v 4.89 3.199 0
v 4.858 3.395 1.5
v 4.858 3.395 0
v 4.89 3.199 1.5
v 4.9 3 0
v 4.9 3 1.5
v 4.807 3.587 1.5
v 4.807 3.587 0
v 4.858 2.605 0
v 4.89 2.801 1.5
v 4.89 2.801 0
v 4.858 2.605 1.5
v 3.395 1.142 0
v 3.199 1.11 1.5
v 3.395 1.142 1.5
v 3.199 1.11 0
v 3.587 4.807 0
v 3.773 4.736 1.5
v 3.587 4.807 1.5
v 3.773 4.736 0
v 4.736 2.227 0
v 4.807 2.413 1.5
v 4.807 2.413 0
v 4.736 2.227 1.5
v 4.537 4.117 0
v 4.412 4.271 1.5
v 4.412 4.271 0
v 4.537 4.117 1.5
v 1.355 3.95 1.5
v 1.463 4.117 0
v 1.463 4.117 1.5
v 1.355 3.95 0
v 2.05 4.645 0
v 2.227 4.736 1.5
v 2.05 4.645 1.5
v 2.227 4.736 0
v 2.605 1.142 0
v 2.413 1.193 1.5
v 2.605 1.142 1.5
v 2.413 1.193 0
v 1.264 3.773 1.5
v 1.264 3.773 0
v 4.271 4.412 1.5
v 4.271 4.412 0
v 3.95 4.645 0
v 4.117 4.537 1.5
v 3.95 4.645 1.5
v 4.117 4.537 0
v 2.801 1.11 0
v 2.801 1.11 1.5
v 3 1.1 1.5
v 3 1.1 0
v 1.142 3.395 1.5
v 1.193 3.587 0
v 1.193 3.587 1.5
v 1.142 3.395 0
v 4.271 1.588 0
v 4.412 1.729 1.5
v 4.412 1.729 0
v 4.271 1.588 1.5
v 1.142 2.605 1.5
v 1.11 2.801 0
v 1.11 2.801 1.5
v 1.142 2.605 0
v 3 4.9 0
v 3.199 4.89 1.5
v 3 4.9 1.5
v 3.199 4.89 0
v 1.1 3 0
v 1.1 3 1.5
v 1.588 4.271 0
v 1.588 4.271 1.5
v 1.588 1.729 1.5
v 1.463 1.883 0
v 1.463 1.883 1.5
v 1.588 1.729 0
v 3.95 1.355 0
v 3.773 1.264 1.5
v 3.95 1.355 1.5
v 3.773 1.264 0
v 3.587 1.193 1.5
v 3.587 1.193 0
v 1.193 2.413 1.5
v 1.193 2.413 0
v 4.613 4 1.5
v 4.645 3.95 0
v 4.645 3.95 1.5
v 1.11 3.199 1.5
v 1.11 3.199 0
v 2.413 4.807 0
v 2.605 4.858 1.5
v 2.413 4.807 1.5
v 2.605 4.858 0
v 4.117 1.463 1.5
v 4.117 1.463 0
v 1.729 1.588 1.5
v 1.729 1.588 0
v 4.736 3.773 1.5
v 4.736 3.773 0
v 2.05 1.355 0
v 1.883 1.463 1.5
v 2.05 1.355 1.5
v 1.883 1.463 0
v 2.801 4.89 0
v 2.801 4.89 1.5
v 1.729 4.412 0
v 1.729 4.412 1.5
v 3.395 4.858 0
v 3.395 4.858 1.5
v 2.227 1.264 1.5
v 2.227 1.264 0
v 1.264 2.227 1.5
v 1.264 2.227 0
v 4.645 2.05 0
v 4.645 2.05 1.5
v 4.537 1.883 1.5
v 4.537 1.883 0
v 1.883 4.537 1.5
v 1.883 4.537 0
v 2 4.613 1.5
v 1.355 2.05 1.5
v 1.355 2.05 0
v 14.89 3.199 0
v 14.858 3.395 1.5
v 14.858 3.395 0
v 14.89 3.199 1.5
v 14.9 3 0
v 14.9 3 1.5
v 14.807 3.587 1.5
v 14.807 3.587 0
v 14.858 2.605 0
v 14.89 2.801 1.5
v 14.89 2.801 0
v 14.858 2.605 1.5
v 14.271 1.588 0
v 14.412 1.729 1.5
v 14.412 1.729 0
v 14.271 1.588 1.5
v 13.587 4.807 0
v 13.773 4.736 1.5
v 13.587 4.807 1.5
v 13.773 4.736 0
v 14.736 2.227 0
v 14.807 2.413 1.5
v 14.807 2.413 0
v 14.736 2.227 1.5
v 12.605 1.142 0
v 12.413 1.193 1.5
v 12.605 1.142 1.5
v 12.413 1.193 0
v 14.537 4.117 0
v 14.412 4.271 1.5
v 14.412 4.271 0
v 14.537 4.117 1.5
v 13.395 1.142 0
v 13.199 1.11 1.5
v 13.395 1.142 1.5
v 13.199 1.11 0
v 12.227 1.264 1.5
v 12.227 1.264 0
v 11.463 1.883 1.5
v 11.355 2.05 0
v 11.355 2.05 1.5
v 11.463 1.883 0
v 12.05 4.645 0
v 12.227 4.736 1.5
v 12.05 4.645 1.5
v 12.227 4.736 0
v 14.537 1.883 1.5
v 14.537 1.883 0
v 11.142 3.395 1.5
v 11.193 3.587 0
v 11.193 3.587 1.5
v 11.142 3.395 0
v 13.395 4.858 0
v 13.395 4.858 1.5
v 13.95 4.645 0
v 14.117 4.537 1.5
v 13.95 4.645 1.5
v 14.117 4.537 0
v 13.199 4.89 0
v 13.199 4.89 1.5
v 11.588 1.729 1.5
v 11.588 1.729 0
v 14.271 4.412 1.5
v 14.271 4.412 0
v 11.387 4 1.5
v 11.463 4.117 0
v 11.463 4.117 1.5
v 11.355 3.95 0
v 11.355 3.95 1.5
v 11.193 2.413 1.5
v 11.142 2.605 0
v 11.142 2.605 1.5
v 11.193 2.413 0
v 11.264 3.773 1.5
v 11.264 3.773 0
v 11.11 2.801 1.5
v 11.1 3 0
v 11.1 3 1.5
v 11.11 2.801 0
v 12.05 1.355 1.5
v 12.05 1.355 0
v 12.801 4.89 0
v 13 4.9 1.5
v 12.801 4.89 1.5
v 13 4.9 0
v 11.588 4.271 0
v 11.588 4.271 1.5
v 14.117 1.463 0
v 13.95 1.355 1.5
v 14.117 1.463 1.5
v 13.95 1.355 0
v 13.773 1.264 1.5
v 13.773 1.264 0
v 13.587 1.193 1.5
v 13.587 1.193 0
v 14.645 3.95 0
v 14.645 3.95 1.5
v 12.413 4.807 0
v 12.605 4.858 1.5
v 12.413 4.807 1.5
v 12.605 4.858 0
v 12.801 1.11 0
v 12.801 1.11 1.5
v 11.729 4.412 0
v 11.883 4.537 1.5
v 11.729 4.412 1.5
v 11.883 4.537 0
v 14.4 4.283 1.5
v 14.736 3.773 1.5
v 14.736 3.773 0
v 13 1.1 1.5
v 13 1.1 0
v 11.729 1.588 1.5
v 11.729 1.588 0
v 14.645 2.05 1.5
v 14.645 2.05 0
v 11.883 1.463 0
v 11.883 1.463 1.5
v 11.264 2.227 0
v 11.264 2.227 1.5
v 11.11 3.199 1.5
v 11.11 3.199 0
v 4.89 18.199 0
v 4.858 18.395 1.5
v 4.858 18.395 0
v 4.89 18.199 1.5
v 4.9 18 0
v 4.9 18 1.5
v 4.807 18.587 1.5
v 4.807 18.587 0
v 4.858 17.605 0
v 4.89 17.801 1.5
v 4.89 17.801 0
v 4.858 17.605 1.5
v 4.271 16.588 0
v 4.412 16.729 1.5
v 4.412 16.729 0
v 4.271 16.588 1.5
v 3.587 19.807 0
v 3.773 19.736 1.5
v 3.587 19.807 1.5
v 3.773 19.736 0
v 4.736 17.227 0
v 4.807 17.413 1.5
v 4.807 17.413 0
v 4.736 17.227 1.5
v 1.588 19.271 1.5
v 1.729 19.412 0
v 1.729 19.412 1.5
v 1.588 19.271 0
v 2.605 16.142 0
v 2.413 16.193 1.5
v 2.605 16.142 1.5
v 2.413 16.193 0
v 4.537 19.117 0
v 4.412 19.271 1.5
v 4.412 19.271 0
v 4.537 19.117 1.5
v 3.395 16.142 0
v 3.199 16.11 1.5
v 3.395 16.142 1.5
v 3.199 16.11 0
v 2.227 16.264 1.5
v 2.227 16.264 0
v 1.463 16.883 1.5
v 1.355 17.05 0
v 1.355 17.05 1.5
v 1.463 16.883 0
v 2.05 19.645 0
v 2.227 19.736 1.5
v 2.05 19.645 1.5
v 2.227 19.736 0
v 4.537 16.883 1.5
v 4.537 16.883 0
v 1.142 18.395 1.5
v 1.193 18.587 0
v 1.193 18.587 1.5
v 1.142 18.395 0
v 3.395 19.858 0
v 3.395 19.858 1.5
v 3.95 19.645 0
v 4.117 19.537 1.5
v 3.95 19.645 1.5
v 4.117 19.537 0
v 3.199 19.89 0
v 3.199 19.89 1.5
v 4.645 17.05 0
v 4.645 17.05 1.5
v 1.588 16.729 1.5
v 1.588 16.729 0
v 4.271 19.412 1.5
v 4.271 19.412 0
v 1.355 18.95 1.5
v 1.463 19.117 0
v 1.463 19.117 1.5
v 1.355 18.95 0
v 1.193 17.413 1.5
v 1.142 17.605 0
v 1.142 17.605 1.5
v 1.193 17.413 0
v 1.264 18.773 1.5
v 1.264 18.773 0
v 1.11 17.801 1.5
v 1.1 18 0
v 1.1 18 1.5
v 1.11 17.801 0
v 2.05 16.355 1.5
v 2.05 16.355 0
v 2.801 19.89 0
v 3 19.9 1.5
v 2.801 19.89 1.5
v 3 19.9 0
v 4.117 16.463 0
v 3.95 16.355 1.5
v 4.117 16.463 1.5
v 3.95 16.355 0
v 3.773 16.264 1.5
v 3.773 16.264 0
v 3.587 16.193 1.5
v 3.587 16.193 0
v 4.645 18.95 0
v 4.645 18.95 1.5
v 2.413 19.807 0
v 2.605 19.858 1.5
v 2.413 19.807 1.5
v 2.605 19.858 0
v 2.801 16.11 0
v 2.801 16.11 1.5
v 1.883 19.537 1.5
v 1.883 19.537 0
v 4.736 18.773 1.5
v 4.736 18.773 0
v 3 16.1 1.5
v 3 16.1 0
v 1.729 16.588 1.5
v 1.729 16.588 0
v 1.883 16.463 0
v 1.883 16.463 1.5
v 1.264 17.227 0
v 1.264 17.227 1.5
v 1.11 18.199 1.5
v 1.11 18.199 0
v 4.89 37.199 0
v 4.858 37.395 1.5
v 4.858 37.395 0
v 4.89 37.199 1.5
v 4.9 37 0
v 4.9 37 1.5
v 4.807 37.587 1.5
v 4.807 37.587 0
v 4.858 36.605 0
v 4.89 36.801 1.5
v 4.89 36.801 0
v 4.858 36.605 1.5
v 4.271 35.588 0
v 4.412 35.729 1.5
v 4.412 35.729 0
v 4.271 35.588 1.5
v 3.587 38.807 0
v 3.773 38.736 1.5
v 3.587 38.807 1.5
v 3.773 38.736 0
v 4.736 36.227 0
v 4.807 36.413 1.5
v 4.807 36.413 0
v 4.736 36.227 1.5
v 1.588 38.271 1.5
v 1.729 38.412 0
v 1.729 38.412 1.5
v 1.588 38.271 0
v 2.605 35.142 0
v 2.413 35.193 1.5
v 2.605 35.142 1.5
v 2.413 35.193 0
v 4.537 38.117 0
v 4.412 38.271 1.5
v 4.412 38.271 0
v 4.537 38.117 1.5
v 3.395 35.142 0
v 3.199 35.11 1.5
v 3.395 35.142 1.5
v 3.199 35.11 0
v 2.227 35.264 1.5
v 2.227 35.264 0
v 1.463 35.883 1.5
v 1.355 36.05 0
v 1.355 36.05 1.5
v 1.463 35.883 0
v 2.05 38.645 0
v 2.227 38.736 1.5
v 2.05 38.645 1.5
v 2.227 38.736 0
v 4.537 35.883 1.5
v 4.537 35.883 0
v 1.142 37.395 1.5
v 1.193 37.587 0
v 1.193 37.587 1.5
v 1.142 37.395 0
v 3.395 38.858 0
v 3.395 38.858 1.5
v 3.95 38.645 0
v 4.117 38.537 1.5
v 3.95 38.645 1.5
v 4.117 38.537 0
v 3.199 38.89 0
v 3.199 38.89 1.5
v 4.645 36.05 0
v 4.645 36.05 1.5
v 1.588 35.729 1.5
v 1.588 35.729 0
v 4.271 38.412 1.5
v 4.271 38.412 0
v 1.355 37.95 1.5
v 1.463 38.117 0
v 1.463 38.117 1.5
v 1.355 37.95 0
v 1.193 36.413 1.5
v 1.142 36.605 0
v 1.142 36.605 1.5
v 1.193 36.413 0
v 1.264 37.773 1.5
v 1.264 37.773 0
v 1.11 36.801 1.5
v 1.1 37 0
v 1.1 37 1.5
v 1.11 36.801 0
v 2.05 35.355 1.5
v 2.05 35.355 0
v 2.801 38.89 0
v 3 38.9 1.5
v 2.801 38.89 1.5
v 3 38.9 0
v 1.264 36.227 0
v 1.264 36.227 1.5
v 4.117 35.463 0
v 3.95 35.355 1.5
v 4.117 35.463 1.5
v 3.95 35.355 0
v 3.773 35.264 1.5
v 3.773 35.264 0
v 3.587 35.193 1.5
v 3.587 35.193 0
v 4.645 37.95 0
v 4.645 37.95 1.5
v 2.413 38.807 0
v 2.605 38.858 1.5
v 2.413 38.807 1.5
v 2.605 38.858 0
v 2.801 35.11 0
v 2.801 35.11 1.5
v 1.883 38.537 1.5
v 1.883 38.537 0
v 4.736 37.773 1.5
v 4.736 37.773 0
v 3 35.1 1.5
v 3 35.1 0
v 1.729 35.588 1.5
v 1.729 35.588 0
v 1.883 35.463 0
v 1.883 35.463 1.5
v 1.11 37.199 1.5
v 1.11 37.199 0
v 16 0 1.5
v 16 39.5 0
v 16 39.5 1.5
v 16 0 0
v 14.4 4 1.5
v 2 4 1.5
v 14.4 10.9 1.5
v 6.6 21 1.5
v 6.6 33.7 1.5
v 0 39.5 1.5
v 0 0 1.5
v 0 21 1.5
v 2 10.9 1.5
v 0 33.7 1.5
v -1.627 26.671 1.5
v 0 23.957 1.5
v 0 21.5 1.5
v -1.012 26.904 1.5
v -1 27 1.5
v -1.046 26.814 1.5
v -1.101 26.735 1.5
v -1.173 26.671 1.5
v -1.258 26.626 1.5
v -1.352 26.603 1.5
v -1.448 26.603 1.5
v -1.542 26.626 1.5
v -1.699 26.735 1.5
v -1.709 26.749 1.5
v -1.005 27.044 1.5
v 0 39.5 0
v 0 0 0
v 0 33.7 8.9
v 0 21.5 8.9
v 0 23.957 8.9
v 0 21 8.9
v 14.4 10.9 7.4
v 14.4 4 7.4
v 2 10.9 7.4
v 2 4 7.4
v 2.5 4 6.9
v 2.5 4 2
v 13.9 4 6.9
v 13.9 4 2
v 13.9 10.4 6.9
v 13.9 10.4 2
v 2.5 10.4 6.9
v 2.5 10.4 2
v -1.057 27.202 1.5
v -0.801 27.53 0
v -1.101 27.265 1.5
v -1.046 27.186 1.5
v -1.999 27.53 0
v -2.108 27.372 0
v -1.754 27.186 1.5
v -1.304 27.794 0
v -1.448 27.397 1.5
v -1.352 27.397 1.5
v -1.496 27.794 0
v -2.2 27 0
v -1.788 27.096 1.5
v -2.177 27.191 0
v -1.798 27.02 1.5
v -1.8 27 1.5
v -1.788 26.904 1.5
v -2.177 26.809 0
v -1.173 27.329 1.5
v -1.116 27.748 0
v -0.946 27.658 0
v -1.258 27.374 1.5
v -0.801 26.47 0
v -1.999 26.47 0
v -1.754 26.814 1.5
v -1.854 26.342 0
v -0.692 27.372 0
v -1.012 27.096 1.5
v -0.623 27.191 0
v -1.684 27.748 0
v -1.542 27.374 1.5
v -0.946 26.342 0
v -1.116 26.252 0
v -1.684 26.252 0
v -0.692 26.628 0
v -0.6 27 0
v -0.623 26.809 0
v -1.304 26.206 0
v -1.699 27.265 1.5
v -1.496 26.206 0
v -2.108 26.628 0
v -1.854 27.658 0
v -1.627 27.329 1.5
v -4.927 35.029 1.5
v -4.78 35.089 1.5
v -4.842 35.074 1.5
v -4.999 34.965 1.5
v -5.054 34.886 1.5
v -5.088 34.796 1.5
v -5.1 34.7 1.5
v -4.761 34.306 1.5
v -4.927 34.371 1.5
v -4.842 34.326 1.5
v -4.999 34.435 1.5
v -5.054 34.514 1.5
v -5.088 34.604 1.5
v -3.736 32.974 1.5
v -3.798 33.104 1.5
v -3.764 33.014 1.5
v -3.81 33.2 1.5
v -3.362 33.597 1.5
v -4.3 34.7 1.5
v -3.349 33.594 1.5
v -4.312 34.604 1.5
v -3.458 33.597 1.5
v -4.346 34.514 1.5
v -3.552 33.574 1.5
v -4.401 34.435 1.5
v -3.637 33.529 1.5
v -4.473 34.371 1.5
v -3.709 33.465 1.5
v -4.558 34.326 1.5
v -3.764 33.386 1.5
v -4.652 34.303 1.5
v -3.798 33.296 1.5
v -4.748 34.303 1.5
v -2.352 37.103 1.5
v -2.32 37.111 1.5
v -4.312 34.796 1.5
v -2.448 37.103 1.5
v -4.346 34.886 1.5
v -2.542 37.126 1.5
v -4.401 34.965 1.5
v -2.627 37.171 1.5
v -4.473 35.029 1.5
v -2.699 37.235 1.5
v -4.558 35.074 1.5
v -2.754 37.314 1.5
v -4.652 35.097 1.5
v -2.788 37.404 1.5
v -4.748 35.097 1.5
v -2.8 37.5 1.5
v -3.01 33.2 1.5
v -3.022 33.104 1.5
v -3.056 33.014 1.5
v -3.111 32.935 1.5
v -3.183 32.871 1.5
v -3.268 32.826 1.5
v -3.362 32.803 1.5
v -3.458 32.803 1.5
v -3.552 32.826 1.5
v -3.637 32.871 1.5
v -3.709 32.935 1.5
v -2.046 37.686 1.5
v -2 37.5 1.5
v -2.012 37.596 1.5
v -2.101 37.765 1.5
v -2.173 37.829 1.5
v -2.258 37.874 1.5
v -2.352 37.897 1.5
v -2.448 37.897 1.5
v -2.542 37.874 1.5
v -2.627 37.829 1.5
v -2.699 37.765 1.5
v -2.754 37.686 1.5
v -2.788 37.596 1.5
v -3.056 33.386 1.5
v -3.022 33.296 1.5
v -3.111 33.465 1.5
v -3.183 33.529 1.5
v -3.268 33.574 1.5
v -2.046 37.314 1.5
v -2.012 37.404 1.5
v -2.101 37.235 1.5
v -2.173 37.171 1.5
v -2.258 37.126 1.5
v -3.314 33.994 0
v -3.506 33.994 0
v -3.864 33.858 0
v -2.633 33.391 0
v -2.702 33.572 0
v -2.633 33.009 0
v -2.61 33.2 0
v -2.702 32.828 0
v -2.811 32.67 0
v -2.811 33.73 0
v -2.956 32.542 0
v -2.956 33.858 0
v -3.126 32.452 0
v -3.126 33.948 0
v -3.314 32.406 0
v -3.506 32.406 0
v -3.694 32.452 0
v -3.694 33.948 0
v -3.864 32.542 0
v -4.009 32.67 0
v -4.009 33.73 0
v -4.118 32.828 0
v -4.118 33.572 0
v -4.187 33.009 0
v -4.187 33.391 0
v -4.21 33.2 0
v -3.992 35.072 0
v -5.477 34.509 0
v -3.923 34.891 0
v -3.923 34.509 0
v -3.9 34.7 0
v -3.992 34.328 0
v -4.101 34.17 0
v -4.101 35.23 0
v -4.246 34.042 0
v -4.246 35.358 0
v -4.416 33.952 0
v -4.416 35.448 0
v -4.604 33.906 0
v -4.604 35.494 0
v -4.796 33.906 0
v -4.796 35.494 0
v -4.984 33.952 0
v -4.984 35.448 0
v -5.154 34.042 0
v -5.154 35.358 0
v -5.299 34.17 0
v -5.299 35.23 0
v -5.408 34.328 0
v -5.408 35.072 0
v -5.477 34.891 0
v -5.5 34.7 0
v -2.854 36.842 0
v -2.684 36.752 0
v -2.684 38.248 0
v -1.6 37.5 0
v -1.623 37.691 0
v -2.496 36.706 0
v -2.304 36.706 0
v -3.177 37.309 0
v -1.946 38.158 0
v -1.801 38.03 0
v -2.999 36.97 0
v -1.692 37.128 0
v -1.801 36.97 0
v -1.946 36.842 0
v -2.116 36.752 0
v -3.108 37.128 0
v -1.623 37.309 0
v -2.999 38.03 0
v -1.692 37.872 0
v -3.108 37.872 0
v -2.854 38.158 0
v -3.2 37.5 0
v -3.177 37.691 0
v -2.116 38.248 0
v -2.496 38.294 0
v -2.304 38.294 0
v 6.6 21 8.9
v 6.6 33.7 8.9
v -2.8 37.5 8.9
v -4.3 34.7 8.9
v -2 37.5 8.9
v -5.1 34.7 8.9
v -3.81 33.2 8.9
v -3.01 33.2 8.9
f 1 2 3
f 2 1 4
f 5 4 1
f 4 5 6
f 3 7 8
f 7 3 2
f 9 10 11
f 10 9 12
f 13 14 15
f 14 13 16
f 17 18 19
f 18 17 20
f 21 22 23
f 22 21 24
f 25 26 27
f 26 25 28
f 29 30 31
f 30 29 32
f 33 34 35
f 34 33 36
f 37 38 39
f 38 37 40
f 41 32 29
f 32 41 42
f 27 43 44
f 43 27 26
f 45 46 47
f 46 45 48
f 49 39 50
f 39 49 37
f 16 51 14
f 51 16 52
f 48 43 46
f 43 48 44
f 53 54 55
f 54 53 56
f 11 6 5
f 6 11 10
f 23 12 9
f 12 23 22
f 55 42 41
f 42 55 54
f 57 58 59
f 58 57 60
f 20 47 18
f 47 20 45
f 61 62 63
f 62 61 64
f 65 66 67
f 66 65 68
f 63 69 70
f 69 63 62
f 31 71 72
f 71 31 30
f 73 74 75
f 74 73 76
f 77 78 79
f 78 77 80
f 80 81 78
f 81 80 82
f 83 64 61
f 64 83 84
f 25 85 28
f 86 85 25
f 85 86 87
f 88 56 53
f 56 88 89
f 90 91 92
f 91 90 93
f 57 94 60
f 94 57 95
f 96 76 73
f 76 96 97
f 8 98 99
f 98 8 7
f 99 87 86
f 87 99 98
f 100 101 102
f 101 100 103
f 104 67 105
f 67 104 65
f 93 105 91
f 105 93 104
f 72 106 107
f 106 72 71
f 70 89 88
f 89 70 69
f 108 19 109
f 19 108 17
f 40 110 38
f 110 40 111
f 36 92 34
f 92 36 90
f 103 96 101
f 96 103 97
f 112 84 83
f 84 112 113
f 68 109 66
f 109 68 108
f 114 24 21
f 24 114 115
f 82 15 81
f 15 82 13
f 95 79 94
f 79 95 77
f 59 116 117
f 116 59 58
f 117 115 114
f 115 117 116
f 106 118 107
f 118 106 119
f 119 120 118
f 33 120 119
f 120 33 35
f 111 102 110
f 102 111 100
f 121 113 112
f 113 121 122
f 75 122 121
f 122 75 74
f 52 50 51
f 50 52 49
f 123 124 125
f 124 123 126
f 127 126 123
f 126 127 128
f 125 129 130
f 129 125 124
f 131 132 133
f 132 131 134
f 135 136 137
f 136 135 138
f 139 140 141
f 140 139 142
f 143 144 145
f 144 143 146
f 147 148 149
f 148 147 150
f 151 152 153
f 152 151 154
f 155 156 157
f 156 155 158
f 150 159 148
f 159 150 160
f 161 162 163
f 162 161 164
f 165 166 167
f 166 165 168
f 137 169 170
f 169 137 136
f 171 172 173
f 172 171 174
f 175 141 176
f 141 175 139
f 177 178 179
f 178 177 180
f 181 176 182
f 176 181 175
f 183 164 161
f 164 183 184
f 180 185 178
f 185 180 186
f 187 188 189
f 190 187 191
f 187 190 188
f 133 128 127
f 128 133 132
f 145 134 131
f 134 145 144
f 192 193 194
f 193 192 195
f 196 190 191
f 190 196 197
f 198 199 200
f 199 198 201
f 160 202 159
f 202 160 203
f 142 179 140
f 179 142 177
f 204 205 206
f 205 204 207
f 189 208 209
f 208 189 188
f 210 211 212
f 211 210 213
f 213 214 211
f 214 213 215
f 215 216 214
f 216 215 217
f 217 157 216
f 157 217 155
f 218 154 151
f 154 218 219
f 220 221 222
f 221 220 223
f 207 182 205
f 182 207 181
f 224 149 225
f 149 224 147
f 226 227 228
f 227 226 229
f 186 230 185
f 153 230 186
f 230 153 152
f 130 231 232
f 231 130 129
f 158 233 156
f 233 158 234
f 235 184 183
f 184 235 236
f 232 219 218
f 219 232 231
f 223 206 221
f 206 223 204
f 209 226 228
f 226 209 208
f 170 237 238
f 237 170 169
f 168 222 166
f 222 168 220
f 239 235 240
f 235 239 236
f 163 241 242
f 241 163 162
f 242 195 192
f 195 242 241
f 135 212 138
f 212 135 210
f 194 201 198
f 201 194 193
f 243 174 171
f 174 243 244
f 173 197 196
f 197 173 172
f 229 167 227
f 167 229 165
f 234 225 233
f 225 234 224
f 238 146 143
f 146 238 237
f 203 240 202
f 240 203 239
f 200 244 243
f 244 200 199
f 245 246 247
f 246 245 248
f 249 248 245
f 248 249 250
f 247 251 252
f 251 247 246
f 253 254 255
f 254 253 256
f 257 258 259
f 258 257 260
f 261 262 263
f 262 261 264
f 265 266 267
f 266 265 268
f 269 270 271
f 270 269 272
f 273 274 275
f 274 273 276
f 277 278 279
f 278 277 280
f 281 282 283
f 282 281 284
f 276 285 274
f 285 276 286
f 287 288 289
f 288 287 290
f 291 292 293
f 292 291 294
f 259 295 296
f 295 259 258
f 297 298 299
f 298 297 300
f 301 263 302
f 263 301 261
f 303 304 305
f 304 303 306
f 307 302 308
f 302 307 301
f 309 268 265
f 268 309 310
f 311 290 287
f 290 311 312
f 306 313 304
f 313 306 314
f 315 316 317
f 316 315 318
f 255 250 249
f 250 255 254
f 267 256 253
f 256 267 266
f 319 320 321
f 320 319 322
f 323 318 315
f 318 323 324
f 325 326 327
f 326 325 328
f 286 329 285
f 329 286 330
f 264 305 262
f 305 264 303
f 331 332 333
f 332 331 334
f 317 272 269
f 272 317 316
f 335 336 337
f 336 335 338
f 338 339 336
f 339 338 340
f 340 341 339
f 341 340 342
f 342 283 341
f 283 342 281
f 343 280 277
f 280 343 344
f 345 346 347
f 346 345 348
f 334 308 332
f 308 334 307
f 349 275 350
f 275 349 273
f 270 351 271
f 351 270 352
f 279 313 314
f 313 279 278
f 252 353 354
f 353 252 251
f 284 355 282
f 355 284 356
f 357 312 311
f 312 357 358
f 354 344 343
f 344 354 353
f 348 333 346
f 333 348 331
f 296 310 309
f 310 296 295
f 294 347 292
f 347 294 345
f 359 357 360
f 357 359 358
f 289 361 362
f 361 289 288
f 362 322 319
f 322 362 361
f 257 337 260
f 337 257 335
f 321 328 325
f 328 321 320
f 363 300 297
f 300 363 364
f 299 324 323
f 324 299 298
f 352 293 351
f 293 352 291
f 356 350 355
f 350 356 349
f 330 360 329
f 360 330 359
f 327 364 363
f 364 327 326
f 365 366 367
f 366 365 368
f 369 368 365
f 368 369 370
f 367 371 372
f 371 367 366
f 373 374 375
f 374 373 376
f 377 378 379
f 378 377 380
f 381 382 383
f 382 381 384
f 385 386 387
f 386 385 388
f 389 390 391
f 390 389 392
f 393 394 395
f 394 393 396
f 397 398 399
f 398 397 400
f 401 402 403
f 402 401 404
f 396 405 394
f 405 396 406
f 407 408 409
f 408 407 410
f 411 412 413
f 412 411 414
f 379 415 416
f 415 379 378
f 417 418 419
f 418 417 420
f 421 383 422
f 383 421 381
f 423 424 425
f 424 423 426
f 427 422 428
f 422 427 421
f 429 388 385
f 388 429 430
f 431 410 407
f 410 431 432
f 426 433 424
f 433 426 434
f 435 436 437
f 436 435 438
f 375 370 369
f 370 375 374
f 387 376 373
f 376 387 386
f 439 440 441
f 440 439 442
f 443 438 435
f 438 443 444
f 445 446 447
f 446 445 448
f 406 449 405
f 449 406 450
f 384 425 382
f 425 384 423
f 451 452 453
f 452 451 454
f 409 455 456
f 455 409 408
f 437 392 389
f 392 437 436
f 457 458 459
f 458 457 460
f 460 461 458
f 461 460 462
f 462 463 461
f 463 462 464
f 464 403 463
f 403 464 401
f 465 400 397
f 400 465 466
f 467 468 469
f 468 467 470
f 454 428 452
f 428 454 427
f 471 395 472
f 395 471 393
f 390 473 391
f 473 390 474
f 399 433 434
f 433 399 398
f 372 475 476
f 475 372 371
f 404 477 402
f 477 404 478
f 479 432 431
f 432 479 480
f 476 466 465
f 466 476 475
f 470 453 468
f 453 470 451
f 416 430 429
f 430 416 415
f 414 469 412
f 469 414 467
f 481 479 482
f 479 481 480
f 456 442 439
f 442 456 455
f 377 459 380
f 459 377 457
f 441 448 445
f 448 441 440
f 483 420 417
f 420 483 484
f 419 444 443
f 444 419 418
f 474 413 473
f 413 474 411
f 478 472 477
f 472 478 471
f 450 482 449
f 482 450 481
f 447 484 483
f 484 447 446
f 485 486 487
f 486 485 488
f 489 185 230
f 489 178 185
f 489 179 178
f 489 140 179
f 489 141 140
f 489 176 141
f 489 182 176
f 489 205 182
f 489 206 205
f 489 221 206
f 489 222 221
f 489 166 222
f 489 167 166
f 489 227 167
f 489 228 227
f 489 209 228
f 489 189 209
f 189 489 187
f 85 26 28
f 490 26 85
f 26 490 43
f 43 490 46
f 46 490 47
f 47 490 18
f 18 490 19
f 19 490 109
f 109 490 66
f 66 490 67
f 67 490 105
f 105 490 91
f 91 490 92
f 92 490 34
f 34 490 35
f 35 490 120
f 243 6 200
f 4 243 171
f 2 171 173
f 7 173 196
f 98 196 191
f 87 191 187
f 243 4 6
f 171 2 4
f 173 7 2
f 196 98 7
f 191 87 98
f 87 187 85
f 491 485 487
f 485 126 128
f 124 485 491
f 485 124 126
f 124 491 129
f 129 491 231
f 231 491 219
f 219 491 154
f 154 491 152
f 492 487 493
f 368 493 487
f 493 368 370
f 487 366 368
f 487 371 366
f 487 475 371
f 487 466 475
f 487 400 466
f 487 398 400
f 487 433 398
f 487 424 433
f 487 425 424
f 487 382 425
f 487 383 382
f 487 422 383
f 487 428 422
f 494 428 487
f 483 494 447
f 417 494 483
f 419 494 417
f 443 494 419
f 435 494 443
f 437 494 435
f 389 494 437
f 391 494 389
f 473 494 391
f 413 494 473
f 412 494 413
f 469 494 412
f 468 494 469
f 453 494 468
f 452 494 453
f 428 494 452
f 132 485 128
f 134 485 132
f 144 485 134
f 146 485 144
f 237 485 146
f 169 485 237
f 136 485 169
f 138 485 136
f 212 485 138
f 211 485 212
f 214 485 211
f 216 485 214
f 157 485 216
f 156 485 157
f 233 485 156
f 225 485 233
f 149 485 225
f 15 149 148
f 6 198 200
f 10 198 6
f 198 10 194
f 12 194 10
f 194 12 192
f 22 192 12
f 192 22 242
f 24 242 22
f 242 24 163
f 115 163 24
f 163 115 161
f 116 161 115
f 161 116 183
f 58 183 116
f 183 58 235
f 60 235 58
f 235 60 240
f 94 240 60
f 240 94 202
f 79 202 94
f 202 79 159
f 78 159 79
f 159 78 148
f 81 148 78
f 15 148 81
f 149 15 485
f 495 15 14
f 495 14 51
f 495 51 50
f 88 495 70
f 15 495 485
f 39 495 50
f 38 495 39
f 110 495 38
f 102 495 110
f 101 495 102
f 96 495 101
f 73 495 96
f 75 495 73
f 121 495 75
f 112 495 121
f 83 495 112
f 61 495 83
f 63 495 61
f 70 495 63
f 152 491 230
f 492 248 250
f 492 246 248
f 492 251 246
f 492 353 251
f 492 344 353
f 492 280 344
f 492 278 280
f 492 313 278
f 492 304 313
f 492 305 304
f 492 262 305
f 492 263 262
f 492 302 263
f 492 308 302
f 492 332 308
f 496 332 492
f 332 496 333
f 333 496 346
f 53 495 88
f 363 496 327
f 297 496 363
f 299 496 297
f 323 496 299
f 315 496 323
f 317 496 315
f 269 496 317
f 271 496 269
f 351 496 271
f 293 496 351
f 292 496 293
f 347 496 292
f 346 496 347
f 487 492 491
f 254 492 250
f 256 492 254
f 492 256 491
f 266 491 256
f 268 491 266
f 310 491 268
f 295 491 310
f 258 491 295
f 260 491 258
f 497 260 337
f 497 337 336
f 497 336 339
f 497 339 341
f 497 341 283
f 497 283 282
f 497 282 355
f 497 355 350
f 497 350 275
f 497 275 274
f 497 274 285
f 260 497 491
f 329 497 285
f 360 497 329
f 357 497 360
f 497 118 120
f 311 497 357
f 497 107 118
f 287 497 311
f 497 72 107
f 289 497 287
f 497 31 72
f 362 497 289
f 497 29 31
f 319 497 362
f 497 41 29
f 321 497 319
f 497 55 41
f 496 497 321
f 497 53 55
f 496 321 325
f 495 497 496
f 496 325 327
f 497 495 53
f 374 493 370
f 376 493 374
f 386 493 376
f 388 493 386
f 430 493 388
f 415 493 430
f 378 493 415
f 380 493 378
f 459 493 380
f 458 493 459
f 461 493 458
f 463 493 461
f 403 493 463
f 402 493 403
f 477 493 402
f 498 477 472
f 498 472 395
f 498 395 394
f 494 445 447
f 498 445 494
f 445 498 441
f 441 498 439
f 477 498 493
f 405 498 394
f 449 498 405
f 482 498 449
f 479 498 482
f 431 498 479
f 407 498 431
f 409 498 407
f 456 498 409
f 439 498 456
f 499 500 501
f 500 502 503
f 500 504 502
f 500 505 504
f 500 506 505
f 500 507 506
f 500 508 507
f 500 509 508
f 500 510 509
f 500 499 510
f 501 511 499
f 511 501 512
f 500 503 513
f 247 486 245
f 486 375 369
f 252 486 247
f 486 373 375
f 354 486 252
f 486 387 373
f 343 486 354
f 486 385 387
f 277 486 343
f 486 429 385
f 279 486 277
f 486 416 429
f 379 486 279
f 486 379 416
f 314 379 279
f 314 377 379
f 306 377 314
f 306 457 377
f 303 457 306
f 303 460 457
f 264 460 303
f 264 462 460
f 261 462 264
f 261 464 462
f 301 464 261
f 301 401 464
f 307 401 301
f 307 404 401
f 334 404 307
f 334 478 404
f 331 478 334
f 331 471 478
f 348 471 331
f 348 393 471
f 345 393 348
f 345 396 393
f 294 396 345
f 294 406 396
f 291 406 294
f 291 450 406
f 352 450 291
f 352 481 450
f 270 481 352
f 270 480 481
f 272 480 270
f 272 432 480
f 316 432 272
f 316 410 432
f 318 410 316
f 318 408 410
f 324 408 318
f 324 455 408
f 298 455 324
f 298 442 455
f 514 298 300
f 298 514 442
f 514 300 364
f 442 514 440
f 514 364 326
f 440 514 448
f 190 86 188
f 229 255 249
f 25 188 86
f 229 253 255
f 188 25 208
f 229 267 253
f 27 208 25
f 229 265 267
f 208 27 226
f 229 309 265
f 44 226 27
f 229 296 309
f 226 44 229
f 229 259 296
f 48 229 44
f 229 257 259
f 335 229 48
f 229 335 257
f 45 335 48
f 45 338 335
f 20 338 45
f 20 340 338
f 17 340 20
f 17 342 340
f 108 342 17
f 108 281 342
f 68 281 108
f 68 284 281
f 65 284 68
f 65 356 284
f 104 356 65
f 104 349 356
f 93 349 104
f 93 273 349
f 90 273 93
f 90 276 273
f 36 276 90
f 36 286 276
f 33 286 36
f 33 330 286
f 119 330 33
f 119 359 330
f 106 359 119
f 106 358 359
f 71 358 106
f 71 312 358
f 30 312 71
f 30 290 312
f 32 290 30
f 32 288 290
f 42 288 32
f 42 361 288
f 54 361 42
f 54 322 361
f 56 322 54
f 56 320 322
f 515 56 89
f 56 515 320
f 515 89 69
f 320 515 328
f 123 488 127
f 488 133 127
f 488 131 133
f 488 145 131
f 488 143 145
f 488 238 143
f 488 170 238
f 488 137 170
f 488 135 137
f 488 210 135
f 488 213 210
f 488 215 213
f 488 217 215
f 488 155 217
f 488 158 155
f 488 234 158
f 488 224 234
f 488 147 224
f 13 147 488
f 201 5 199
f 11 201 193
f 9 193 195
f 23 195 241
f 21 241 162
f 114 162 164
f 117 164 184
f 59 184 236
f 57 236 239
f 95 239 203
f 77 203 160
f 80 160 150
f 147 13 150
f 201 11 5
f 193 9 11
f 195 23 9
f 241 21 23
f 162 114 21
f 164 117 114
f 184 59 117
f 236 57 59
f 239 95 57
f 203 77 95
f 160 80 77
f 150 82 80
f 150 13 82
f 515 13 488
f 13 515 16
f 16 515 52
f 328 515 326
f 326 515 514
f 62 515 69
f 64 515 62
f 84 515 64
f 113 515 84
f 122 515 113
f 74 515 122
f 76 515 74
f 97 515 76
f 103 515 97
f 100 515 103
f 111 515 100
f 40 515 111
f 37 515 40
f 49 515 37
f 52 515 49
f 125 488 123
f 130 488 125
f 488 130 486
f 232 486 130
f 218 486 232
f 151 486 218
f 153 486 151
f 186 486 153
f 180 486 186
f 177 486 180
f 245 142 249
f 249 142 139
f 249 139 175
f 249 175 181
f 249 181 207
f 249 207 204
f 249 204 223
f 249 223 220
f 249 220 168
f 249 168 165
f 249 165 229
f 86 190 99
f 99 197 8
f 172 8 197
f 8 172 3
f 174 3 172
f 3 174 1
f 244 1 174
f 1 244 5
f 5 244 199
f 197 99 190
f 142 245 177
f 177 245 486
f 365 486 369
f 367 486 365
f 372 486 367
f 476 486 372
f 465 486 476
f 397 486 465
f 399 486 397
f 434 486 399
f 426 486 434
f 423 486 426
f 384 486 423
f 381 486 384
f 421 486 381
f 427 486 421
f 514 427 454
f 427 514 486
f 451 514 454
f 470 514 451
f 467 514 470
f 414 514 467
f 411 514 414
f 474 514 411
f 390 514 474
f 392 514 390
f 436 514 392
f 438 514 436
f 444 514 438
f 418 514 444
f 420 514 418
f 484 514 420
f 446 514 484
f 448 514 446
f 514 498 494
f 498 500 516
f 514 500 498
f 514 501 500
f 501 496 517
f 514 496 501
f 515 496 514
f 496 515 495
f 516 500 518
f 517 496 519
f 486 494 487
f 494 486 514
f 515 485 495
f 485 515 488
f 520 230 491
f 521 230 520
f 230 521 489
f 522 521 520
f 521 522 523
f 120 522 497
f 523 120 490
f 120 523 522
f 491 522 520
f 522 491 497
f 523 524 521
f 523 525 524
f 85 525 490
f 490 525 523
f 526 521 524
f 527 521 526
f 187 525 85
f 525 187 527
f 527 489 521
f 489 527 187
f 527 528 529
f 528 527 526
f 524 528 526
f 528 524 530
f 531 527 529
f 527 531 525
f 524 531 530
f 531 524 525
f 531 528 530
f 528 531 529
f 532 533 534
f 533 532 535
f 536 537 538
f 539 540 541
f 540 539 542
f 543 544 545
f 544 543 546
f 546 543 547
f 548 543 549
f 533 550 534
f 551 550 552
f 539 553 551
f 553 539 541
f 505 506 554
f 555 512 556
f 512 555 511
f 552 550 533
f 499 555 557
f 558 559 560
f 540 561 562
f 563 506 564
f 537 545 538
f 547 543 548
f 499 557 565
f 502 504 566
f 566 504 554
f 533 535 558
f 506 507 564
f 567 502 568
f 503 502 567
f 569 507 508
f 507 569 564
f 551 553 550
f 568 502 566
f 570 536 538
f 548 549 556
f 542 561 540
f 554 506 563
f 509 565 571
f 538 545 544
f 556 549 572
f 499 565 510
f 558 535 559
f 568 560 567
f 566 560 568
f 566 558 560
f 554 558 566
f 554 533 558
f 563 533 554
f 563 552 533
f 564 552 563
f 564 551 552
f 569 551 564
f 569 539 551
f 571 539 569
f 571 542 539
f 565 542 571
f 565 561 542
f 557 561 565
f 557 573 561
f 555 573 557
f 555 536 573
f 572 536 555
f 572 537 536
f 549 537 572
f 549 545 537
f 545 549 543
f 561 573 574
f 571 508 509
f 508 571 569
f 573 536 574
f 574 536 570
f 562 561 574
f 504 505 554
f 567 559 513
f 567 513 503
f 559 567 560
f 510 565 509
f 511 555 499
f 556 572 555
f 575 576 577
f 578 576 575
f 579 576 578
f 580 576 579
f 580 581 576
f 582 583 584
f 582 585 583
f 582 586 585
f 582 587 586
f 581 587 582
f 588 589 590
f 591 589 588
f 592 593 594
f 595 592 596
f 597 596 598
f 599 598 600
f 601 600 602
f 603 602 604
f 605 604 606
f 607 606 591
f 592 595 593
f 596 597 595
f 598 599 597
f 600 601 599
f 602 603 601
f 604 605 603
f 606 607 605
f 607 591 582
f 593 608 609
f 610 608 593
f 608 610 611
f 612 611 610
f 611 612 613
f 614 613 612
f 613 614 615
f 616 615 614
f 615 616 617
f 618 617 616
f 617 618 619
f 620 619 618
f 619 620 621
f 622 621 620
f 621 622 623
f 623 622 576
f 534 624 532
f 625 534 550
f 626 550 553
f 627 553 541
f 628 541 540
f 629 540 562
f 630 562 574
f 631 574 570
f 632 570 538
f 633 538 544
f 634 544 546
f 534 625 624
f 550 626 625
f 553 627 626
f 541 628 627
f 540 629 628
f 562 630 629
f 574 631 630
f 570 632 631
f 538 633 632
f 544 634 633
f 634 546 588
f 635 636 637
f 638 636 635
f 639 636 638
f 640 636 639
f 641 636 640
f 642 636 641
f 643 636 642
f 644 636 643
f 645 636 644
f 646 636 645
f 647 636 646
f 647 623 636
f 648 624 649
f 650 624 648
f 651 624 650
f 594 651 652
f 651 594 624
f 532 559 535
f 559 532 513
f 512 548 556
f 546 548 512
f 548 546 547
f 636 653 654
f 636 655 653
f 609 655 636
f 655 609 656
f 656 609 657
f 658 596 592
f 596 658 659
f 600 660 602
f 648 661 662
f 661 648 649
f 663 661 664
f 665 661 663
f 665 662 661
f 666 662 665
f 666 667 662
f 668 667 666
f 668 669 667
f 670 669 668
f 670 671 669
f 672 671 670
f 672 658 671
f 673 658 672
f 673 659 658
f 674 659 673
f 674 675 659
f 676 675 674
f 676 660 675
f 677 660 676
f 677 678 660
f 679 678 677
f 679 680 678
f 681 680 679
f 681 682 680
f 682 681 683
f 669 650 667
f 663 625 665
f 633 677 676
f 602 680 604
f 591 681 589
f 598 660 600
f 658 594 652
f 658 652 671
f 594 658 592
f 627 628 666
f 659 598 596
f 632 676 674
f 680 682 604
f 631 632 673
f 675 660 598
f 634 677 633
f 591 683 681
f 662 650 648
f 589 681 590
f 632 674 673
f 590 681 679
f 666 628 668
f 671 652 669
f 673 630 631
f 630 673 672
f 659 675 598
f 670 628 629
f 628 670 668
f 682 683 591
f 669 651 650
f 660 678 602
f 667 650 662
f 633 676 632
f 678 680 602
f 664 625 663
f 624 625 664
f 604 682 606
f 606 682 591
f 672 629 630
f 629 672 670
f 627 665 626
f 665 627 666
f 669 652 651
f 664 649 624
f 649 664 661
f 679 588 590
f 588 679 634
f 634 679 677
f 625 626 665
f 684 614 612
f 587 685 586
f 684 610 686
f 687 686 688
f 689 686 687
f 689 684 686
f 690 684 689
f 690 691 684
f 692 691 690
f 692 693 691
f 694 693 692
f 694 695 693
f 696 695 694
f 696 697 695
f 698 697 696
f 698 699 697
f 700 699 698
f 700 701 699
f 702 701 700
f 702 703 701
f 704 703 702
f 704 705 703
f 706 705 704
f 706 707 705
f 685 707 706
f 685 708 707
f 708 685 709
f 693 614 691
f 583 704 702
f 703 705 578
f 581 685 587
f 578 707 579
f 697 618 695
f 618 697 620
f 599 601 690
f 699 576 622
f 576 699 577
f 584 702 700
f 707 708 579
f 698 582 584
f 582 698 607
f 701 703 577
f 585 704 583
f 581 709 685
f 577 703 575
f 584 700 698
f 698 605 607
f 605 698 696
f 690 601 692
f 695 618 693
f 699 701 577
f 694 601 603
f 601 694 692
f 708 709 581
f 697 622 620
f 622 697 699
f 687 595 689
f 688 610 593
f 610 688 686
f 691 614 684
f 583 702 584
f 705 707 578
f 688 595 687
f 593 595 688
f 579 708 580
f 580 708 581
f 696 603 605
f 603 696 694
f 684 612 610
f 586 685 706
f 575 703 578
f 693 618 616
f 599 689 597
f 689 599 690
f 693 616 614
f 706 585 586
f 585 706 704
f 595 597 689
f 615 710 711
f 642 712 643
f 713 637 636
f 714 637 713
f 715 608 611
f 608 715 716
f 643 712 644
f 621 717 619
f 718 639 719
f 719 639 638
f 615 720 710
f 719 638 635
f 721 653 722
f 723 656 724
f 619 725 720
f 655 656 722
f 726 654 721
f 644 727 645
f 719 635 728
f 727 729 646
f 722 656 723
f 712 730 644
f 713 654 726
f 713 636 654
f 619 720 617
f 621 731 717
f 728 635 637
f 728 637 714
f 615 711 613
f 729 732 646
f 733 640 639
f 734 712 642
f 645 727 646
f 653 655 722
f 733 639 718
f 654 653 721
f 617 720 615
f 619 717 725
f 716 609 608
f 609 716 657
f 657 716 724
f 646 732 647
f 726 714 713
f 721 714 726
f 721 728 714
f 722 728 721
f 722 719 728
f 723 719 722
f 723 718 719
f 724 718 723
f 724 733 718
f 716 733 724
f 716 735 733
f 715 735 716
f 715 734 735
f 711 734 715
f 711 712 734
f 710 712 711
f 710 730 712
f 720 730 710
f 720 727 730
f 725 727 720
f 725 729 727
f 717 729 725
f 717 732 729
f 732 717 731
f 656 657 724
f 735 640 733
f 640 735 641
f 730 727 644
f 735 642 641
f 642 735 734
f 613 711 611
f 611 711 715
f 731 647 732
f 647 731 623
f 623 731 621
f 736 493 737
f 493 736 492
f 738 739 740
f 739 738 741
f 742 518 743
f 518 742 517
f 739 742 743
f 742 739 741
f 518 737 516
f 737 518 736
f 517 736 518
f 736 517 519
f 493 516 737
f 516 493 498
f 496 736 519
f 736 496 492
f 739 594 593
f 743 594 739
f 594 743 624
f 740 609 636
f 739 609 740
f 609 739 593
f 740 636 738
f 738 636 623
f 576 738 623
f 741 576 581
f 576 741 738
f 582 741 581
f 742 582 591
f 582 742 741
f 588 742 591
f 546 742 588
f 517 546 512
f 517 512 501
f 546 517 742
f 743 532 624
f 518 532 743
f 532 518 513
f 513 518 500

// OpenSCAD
// Copyright 2015 Arthur Davis (thingiverse.com/artdavis)
// This file is licensed under a Creative Commons Attribution 4.0
// International License.
// THE SOFTWARE IS PROVIDED "AS IS", WITHOUT WARRANTY OF ANY KIND, EXPRESS OR
// IMPLIED, INCLUDING BUT NOT LIMITED TO THE WARRANTIES OF MERCHANTABILITY,
// FITNESS FOR A PARTICULAR PURPOSE AND NONINFRINGEMENT. IN NO EVENT SHALL THE
// AUTHORS OR COPYRIGHT HOLDERS BE LIABLE FOR ANY CLAIM, DAMAGES OR OTHER
// LIABILITY, WHETHER IN AN ACTION OF CONTRACT, TORT OR OTHERWISE, ARISING
// FROM, OUT OF OR IN CONNECTION WITH THE SOFTWARE OR THE USE OR OTHER
// DEALINGS IN THE SOFTWARE.

// Endstop limit switch board
//
// This is a model of the MakerBot endstop limit switch in my Makerfront i3PRO.
// This is a commonly used switch in other 3D printers. I wanted a CAD model of
// the switch for a project but the model also prints well enough for a
// tangible application. The model includes some tiny stubs beneath the leaf
// spring to help the material bridge which are easily snipped off after
// printing. To get a CAD model without the stubs, change the "support=true"
// parameter in the limswitch() call near the bottom of the file to
// "support=false".

// Units are in mm

// Optimize view for Makerbot Customizer:
// preview[view:"south west", tile:"top diagonal"]

/* [Global] */
// Whether or not to include printer support
support = "Yes"; // [Yes, No]
// 0.8 prints well (atcual thick ~0.25)
leaf_spring_thickness = 0.8; // [0.2:0.1:1.2]


/* [Hidden] */
// Special variables for arc generation:
$fa = 0.1; // minimum fragment angle
$fs = 0.2; // minimum fragment size

// Circuit board dimensions
board_width=16;
board_height=39.5;
board_th=1.5;

module circ_board() {
// Circuit board with holes
    hole_diam = 3.8;
    hole_coords = [
      [3, 3],
      [13, 3],
      [3, 18],
      [3, 37],
    ];
    difference() {
        // Circuit board
        cube(size = [board_width,
                     board_height,
                     board_th]);
        for (xy = hole_coords) {
            translate([xy[0], xy[1], 0])
                cylinder(h=4, d=hole_diam, center=true);
        }
    }
}

module connector(origin=[0, 0, 0]) {
    // Connector
    //
    // Parameters
    // ----------
    // origin : [x, y, z] coordinate of connector origin
    //          (default: [0, 0, 0]
    conn_width = 12.4;
    conn_depth = 6.9;
    conn_height = 5.9;
    conn_wall = 0.5;
    translate(origin) {
        difference() {
        // External shell of connector
        cube(size = [conn_width, conn_depth, conn_height]);
        // Internal shell of connector
        translate([conn_wall, -conn_wall, conn_wall])
        cube(size = [conn_width - conn_wall * 2,
                     conn_depth,
                     conn_height - conn_wall * 2]);
        }
    }
}

// Limit switch
module limswitch(origin=[0, 0, 0], support=true) {
    // Limit Switch
    //
    // Parameters
    // ----------
    // origin : [x, y, z] coordinate of limit switch origin
    //          (default: [0, 0, 0]
    // support : boolean for putting in support for the leaf spring
    //           when printing (default: true)
    sw_width = 6.6;
    sw_length = 12.7;
    sw_height = 7.4;
    leaf_th = leaf_spring_thickness;
    leaf_coords = [
      [0, 0.5],
      [-3.81 , 12.2],
      [-5.1, 13.7],
      [-2.8, 16.5],
      // Give the leaf spring thickness so it can be extruded
      [-2.8 + leaf_th, 16.5],
      [-5.1 + leaf_th, 13.7],
      [-3.81 + leaf_th , 12.2],
      [0 + leaf_th, 0.5],
    ];
    support_coords = [
      [-1.8, 6],
      [-3.81 , 12.2],
      [-5.1, 13.7],
      [-2.8, 16.5],
    ];
    translate(origin) {
        union() {
            cube(size = [sw_width, sw_length, sw_height]);
            linear_extrude(height = sw_height)
                polygon(leaf_coords);
            if(support) {
                for(i = [0 : 3]){
                    translate([support_coords[i][0] + leaf_th/2,
                               support_coords[i][1], -board_th]){
                    cylinder(h=board_th, d1=2*leaf_th, d2=leaf_th);
                    }
                }
            }
        }
    }
}

// Assemble the board
module assemble(support=true) {
    union() {
        circ_board();
        connector(origin=[2, 4, board_th]);
        limswitch(origin=[0, 21, board_th], support=support);
    }
}

if (support == "Yes")
    assemble(support=true);
else
    assemble(support=false);
